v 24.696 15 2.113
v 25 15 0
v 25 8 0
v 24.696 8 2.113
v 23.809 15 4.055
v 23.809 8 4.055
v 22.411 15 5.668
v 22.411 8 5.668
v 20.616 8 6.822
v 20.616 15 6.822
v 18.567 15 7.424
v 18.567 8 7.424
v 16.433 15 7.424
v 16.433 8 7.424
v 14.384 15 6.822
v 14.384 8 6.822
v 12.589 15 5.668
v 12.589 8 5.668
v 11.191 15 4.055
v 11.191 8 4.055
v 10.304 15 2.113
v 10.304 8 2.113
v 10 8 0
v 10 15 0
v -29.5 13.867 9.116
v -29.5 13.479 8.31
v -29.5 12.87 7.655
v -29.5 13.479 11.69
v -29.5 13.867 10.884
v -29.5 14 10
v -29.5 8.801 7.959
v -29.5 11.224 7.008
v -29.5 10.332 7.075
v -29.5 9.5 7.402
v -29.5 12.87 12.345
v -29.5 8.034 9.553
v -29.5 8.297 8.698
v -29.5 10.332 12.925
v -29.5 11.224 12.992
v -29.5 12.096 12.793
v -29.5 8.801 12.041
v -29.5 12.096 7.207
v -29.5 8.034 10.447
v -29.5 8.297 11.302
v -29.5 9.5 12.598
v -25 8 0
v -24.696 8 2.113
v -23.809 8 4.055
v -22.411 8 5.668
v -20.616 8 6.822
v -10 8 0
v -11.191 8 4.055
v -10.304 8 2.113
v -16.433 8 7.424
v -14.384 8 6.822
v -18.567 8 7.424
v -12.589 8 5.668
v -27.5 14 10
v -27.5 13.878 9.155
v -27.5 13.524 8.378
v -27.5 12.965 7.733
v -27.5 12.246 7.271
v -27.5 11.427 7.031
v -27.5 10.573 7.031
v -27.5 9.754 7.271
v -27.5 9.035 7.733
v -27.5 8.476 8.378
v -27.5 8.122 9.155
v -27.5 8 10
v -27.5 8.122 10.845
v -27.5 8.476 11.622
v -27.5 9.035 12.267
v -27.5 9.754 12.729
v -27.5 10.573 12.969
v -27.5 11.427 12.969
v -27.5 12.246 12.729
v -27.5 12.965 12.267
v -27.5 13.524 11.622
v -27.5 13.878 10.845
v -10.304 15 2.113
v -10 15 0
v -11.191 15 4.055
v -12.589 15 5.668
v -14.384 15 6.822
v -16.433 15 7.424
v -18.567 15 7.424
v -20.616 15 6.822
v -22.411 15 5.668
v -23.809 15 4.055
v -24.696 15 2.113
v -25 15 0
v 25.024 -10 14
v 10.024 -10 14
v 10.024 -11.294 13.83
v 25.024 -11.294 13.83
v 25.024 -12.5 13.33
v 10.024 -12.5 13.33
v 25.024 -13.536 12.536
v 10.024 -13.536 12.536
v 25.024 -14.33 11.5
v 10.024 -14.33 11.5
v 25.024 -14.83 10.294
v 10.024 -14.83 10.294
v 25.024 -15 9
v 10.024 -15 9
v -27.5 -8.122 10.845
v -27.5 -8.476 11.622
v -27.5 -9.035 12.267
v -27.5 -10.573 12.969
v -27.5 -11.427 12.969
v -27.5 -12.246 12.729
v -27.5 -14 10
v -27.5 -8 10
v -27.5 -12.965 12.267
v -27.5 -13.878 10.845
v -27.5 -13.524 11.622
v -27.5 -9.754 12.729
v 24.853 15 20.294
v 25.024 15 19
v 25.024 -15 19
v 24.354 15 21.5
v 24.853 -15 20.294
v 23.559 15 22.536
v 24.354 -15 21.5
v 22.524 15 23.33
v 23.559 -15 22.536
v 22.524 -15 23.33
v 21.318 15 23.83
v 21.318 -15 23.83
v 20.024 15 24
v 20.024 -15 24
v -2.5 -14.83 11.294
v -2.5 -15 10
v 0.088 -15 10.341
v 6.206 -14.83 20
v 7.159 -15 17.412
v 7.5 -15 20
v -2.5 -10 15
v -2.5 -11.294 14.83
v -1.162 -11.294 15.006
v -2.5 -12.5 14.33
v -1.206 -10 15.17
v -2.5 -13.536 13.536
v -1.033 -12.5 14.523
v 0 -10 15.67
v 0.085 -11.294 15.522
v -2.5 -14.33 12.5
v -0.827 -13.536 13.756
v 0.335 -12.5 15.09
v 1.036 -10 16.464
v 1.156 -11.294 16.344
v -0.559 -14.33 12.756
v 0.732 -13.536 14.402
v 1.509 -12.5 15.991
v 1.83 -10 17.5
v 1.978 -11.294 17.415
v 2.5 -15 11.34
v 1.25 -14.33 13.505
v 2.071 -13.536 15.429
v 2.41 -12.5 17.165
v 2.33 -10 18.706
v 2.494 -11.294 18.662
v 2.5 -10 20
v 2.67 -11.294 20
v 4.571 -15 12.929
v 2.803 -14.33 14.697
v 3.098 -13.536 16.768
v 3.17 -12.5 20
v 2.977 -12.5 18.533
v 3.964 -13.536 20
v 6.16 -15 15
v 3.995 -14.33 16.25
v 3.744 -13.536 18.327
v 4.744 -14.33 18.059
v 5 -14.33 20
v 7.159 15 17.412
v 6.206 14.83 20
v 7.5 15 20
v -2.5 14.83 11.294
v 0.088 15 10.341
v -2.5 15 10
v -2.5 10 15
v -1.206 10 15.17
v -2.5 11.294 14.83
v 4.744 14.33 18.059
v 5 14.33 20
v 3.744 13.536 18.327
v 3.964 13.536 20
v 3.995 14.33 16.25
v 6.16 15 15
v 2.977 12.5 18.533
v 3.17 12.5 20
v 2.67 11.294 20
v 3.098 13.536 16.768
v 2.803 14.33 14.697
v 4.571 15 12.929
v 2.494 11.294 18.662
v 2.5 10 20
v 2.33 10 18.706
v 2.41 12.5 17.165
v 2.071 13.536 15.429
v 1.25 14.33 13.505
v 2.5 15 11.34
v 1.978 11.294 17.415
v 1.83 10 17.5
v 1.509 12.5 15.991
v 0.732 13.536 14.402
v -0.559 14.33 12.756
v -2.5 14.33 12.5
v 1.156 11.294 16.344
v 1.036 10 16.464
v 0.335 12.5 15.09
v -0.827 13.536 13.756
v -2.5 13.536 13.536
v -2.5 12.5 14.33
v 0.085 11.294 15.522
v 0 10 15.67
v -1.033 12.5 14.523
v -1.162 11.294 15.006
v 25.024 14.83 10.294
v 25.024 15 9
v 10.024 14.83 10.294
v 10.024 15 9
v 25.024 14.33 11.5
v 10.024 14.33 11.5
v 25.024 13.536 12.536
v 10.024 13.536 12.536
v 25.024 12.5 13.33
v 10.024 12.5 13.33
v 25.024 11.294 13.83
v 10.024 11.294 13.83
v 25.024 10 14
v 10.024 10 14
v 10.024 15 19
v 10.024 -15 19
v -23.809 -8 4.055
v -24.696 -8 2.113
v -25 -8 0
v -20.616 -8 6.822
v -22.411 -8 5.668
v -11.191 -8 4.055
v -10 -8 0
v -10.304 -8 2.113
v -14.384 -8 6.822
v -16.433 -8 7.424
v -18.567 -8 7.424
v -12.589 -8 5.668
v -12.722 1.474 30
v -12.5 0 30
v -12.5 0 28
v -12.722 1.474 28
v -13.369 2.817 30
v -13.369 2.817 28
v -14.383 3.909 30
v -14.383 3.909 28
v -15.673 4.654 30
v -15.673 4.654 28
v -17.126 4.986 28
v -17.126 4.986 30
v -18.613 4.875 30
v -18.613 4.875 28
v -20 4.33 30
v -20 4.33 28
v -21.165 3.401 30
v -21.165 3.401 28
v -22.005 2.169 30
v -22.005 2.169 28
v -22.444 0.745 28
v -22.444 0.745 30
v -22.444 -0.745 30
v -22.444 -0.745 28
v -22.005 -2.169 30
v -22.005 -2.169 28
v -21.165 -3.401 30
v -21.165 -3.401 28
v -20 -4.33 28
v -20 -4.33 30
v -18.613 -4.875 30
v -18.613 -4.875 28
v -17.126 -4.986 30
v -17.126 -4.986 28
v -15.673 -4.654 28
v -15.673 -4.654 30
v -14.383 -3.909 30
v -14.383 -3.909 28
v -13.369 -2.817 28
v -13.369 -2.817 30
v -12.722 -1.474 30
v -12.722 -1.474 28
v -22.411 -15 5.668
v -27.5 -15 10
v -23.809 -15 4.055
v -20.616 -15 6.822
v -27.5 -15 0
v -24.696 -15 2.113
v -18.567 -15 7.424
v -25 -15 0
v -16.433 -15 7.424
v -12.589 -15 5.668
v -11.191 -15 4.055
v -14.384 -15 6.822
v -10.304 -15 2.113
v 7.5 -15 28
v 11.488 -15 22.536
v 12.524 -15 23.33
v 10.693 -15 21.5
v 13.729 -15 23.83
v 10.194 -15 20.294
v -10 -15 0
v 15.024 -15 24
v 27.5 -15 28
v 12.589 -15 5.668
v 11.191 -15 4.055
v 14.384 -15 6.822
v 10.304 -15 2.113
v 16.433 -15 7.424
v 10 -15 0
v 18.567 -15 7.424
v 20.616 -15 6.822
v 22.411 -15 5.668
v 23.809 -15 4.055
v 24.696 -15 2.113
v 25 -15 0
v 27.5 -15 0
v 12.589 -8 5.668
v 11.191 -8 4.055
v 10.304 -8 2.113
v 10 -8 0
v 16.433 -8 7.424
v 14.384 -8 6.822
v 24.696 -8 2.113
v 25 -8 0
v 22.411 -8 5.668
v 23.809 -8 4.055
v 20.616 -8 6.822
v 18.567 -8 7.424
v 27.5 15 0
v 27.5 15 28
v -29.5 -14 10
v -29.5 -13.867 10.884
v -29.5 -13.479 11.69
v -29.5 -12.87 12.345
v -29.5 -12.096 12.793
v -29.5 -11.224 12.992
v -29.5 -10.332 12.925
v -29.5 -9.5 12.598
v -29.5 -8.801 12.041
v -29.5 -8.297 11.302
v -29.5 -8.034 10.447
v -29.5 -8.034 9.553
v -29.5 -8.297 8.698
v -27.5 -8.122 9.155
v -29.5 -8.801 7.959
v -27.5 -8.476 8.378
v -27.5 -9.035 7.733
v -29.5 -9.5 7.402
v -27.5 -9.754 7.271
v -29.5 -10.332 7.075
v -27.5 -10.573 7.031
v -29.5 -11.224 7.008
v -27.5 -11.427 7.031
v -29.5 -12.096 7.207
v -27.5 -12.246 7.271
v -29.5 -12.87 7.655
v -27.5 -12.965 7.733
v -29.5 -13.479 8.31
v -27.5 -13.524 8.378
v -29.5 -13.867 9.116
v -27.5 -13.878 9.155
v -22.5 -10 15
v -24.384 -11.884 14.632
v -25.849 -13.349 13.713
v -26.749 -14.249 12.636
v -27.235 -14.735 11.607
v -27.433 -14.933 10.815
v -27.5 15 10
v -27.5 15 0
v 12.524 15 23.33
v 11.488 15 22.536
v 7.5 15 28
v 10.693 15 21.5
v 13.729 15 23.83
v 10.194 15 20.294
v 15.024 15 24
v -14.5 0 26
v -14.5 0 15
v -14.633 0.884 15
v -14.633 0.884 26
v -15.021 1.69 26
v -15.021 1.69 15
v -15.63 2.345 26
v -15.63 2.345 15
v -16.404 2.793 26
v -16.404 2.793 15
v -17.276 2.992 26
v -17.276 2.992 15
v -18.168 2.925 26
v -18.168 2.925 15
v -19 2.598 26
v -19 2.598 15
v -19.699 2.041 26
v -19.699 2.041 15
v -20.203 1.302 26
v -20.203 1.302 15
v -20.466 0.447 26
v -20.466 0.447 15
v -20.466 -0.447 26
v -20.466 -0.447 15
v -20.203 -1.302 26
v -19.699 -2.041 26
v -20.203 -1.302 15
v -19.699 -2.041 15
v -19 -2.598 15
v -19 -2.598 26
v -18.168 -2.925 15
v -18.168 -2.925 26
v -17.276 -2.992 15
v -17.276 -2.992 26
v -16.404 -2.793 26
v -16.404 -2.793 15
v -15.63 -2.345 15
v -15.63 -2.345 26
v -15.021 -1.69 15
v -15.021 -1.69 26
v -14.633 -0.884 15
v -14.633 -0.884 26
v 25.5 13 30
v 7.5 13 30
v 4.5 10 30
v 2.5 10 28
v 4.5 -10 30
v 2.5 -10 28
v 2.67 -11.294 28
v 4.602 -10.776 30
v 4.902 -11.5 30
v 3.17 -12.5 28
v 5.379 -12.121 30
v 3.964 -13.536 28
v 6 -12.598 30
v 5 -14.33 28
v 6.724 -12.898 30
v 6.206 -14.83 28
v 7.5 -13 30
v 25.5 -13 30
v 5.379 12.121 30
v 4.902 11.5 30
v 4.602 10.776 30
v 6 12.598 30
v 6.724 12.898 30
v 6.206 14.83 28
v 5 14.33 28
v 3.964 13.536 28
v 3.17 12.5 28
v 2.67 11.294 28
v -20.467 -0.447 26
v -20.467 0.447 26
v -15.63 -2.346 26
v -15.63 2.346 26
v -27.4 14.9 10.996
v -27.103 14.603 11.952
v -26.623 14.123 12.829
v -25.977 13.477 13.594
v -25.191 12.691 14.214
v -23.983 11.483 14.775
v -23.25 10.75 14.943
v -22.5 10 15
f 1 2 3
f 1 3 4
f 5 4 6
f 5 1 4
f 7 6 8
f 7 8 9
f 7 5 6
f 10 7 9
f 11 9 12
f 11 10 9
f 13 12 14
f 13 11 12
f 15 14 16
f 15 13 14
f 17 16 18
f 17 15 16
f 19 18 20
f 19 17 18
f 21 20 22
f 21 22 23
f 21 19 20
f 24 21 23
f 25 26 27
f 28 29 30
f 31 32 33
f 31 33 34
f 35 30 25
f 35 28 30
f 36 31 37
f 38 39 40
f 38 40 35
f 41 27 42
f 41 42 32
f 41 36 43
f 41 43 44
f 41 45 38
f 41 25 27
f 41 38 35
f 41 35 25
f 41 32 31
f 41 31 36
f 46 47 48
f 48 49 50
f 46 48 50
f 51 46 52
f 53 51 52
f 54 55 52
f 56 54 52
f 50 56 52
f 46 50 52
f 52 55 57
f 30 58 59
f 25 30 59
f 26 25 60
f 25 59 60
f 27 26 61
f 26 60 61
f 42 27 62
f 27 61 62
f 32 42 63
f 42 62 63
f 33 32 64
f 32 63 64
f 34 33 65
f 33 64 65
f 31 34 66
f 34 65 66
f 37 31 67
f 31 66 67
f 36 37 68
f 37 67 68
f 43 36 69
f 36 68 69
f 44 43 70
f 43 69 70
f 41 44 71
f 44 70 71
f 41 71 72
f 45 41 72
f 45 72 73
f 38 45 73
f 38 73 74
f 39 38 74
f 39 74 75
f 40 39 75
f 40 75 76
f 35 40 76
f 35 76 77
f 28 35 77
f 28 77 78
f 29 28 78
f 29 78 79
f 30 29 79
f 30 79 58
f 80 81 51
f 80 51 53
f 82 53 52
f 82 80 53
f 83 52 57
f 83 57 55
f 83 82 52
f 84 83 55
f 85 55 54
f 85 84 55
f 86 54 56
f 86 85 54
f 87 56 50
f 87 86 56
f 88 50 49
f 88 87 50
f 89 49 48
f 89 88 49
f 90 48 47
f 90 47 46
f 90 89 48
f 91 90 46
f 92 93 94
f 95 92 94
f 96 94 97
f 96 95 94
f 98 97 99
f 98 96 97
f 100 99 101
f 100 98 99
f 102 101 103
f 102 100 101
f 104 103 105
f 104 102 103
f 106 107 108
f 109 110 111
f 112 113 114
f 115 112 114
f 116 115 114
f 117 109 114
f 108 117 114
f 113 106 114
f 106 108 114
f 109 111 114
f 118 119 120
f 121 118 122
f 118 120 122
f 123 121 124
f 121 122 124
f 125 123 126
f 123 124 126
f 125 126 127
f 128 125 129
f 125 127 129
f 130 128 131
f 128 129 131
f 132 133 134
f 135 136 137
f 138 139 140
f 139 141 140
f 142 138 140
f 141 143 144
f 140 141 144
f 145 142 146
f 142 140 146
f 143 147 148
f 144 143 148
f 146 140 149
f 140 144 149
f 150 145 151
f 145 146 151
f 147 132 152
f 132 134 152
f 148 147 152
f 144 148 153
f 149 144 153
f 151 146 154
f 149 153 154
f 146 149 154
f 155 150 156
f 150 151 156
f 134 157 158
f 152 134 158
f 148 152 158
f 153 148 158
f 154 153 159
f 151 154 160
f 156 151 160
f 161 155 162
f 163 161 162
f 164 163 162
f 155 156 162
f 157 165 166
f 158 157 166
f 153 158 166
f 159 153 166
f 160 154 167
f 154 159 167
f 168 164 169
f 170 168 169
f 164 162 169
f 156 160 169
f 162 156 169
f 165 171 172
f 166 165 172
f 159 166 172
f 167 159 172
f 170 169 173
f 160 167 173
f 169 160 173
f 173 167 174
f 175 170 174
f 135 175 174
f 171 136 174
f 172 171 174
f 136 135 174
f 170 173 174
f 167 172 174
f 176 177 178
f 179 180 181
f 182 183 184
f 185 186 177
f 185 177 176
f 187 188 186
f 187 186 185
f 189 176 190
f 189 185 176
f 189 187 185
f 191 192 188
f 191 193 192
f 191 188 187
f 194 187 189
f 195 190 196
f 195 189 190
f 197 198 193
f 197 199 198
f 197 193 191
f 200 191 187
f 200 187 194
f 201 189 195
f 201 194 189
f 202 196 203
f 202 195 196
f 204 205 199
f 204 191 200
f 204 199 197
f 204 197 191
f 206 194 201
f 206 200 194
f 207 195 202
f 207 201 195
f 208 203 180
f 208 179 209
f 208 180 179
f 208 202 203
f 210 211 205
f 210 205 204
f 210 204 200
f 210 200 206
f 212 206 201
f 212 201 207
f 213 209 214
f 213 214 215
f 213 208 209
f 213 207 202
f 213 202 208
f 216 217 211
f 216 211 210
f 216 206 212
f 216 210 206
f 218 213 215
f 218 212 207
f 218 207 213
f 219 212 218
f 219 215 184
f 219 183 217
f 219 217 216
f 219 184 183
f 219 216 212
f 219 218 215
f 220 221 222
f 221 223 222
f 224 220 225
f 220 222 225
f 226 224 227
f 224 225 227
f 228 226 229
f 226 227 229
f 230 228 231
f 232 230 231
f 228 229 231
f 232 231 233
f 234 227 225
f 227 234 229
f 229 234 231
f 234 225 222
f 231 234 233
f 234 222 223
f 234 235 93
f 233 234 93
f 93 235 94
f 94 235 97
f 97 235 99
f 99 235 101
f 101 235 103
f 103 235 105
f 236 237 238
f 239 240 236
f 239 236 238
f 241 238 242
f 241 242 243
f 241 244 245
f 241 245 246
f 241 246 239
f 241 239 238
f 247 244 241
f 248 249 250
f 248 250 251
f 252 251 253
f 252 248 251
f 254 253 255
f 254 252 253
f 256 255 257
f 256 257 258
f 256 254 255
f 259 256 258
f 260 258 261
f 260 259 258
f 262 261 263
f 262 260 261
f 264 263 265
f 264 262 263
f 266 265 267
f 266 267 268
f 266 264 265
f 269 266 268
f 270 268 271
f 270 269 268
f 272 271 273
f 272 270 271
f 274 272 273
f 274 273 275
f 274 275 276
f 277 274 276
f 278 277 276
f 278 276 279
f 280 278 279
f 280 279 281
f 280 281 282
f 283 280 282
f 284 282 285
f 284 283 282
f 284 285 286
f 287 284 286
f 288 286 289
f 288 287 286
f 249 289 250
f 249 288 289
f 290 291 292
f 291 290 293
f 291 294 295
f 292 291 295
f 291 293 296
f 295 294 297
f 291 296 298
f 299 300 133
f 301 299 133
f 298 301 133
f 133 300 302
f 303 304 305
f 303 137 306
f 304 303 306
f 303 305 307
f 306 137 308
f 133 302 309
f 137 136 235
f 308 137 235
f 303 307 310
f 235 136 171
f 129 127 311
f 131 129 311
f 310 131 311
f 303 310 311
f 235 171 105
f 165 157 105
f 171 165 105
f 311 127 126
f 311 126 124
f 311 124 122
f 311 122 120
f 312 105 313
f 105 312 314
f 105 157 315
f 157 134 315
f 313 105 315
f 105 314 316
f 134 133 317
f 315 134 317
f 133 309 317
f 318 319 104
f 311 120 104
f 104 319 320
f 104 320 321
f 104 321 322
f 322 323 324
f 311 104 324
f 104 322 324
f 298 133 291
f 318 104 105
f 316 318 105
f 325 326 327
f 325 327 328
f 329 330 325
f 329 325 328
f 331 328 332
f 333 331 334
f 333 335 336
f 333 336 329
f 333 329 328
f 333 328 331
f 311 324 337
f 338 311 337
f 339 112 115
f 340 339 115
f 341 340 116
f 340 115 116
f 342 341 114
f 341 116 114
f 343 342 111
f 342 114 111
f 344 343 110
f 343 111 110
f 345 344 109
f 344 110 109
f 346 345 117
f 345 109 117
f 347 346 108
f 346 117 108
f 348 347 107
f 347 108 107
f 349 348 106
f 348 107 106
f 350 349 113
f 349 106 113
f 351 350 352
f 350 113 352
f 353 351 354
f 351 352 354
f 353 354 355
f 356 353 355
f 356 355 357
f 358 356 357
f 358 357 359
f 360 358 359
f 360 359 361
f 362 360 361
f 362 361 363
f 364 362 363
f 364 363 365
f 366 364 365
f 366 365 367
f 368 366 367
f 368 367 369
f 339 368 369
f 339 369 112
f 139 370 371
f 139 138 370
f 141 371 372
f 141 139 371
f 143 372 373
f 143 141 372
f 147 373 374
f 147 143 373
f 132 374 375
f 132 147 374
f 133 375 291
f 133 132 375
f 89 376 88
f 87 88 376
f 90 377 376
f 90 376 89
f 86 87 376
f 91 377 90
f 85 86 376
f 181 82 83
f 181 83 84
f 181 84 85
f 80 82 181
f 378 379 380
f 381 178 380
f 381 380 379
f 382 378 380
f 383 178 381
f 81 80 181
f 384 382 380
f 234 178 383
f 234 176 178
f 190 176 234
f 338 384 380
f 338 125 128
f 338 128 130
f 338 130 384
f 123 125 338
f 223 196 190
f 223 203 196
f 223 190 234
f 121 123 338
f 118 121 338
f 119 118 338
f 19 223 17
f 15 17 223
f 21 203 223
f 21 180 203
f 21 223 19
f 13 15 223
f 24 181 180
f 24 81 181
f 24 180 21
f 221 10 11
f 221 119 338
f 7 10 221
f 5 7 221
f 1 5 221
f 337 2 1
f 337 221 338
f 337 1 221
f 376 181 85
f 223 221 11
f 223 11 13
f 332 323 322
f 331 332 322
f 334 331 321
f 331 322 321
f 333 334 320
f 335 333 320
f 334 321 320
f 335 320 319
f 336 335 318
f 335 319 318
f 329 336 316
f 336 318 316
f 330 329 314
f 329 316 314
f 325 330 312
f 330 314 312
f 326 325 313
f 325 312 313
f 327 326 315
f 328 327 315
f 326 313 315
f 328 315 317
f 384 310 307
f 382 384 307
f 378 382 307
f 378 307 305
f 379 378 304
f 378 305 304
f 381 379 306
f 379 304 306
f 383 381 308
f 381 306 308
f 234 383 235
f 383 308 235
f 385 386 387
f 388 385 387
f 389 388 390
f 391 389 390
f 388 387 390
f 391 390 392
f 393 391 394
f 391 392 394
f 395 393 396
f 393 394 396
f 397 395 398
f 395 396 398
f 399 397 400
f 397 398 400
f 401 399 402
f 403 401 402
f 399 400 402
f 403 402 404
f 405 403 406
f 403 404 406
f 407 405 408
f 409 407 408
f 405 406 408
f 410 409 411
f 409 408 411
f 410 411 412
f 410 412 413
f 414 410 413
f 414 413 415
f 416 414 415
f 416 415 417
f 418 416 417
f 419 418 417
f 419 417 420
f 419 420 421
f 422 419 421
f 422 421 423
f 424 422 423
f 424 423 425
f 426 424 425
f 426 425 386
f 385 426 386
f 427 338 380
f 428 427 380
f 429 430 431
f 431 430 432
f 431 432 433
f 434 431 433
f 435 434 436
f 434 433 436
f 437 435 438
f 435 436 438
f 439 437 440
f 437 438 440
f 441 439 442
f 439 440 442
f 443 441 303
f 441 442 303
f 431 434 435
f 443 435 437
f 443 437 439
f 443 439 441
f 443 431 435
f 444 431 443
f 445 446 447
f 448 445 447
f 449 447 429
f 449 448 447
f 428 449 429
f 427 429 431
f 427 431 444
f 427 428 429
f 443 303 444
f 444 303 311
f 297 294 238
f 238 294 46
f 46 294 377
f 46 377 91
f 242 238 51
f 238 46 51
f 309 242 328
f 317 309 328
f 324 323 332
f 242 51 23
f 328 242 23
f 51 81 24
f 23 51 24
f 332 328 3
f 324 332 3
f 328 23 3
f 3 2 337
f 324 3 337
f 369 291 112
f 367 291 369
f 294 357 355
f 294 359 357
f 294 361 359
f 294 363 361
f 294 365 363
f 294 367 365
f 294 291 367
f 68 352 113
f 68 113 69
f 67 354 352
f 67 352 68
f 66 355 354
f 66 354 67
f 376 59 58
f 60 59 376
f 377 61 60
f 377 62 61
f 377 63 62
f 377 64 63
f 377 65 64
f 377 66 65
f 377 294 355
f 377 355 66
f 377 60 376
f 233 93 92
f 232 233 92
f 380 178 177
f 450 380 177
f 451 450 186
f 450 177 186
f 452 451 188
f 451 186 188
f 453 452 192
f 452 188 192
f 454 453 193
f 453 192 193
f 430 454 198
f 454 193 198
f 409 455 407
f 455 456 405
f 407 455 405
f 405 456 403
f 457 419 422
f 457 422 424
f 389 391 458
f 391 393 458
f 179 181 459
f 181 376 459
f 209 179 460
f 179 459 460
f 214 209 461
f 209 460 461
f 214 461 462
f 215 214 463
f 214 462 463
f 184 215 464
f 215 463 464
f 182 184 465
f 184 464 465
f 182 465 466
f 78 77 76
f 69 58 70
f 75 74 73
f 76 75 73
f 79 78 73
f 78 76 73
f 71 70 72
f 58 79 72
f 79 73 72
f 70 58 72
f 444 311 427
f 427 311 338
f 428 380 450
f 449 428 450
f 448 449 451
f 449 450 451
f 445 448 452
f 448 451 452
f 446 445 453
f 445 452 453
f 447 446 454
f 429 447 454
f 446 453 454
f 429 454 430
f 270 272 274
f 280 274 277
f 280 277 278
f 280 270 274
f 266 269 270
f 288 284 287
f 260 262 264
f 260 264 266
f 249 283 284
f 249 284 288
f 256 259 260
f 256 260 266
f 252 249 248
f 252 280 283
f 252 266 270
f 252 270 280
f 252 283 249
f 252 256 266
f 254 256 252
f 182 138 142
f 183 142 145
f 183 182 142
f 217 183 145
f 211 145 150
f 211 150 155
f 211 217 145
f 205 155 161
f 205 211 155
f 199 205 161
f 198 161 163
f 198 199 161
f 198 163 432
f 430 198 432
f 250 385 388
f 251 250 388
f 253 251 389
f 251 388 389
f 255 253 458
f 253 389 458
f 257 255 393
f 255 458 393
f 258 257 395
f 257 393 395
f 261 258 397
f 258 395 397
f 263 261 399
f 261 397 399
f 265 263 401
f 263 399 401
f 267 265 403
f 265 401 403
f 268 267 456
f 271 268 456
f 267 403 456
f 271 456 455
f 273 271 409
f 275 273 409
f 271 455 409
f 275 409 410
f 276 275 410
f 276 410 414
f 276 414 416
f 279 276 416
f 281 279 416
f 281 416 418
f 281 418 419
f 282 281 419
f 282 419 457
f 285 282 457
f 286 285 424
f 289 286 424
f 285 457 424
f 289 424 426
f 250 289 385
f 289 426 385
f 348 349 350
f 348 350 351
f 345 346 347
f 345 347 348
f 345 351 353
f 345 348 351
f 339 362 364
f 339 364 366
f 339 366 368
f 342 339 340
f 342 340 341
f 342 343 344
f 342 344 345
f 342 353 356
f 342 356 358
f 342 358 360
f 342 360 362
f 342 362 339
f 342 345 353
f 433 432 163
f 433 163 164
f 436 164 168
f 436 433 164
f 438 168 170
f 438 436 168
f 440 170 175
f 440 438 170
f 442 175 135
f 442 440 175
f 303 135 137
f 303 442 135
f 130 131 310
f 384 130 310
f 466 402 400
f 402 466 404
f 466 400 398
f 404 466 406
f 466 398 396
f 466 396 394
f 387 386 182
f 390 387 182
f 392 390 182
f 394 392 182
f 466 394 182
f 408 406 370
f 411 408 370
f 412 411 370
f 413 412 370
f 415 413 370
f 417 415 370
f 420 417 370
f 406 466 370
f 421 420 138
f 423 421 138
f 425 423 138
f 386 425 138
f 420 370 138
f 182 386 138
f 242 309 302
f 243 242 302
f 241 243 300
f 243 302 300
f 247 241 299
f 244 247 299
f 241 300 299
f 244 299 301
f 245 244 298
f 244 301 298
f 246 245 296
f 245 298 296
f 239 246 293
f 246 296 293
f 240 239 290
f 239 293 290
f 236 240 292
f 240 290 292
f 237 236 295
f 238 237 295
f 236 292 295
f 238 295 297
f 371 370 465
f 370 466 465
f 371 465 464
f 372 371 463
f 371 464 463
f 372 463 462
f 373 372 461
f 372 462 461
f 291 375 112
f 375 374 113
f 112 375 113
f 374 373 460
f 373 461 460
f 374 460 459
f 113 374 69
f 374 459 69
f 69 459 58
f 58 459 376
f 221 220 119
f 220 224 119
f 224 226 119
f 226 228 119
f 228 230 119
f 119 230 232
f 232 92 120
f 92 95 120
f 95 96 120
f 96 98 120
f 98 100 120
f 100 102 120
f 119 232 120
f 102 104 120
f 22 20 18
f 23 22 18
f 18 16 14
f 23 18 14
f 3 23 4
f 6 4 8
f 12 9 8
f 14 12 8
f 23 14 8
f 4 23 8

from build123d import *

# Parameters (mm, degrees)
F0_W      = 55
F0_H      = 30
F1_DEPTH  = 30
F2_W      = 30
F2_H      = 15
F3_DEPTH  = 30.001
F5_DEPTH  = 7
F6_F1_R   = 5
F6_F2_R   = 5
F7_SIZE   = 2
F9_DEPTH  = 30.001
F10_R     = 5
F12_DEPTH = 2
F13_R     = 3
F14_DEPTH = 15
F15_R     = 5
F15_R_2   = 3
F16_DEPTH = 4
F17_SIZE  = 1.99999


# Not quite as in the source:
# - a fillet or chamfer is up to 0.001 mm smaller than in the source, because OpenCascade refuses the exact size
# - a pattern or mirror of a feature is missing from the dataset's text; its kind, count and spacing are read off the source's solid


with BuildPart() as f1:
    # F0 (on Top) → F1 (new body)
    with BuildSketch(Plane.XY):
        Rectangle(F0_W, F0_H)
    extrude(amount=F1_DEPTH)

    # F2 (on face) → F3 (cut, through all)
    with BuildSketch(Plane.XZ.offset(15)):
        with Locations((-12.5, 22.5)):
            Rectangle(F2_W, F2_H)
    extrude(amount=-F3_DEPTH, mode=Mode.SUBTRACT)

    # F4 (on face) → F5 (cut)
    with BuildSketch(Plane.XZ.offset(15)):
        with BuildLine():
            Line((-25, 0), (-10, 0))
            ThreePointArc((-10, 0), (-17.5, 7.5), (-25, 0))
        make_face()
        with BuildLine():
            ThreePointArc((25, 0), (17.5, 7.5), (10, 0))
            Line((10, 0), (25, 0))
        make_face()
    f5 = extrude(amount=-F5_DEPTH, mode=Mode.SUBTRACT)

    # F5_copies: F5 across plane
    add(f5.mirror(Plane.ZX), mode=Mode.SUBTRACT)

    # F6: fillet of radius 5 on 4 edges, made by hand

    # F6_f1
    f6_f1_edges = [f1.edges().sort_by_distance(p)[0] for p in [
        (2.5, 0, 15),
    ]]
    fillet(f6_f1_edges, radius=F6_F1_R)

    # F6_f2
    f6_f2_edges = [f1.edges().sort_by_distance(p)[0] for p in [
        (-15, -15, 15),
        (-15, 15, 15),
        (-27.5, 0, 15),
        (1.0355339059, 15, 16.4644660941),
        (1.0355339059, -15, 16.4644660941),
    ]]
    fillet(f6_f2_edges, radius=F6_F2_R)

    # F7
    f7_edges = [f1.edges().sort_by_distance(p)[0] for p in [
        (17.5, -15, 30),
        (3.964466, -13.535534, 30),
        (27.5, 0, 30),
        (2.5, 0, 30),
        (17.5, 15, 30),
        (3.964466, 13.535534, 30),
    ]]
    chamfer(f7_edges, length=F7_SIZE)

    # F8 (on face) → F9 (cut, through all)
    with BuildSketch(Plane.XZ.offset(15)):
        with BuildLine():
            Line((20.0235929713, 24), (15.0235929713, 24))
            ThreePointArc((15.0235929713, 24), (11.4880590653, 22.5355339059), (10.0235929713, 19))
            Line((10.0235929713, 19), (10.0235929713, 14))
            Line((10.0235929713, 14), (25.0235929713, 14))
            Line((25.0235929713, 14), (25.0235929713, 19))
            ThreePointArc((25.0235929713, 19), (23.5591268772, 22.5355339059), (20.0235929713, 24))
        make_face()
    extrude(amount=-F9_DEPTH, mode=Mode.SUBTRACT)

    # F10
    f10_edges = [f1.edges().sort_by_distance(p)[0] for p in [
        (17.523593, -15, 14),
        (17.523593, 15, 14),
    ]]
    fillet(f10_edges, radius=F10_R)

    # F11 (on face) → F12 (join)
    with BuildSketch(Plane(origin=(-27.5, 0, 0), x_dir=(0, -1, 0), z_dir=(-1, 0, 0))):
        with BuildLine():
            Line((-14, 10), (-8, 10))
            ThreePointArc((-8, 10), (-11, 13), (-14, 10))
        make_face()
        with BuildLine():
            ThreePointArc((-14, 10), (-11, 7), (-8, 10))
            Line((-8, 10), (-14, 10))
        make_face()
        with BuildLine():
            Line((14, 10), (8, 10))
            ThreePointArc((8, 10), (11, 7), (14, 10))
        make_face()
        with BuildLine():
            ThreePointArc((14, 10), (11, 13), (8, 10))
            Line((8, 10), (14, 10))
        make_face()
    extrude(amount=F12_DEPTH)

    # F13 (on face) → F14 (join)
    with BuildSketch(Plane.XY.offset(15)):
        with Locations((-17.5, 0)):
            Circle(F13_R)
    extrude(amount=F14_DEPTH)

    # F15 (on face) → F16 (join)
    with BuildSketch(Plane.XY.offset(30)):
        with Locations((-17.5, 0)):
            Circle(F15_R)
        with Locations((-17.5, 0)):
            Circle(F15_R_2, mode=Mode.SUBTRACT)
    extrude(amount=-F16_DEPTH)

    # F17 (size 2 in the source; OpenCascade refuses exactly that, so slightly less here)
    f17_edges = [f1.edges().sort_by_distance(p)[0] for p in [
        (-22.5, 0, 26),
    ]]
    chamfer(f17_edges, length=F17_SIZE)


solid = f1.part
